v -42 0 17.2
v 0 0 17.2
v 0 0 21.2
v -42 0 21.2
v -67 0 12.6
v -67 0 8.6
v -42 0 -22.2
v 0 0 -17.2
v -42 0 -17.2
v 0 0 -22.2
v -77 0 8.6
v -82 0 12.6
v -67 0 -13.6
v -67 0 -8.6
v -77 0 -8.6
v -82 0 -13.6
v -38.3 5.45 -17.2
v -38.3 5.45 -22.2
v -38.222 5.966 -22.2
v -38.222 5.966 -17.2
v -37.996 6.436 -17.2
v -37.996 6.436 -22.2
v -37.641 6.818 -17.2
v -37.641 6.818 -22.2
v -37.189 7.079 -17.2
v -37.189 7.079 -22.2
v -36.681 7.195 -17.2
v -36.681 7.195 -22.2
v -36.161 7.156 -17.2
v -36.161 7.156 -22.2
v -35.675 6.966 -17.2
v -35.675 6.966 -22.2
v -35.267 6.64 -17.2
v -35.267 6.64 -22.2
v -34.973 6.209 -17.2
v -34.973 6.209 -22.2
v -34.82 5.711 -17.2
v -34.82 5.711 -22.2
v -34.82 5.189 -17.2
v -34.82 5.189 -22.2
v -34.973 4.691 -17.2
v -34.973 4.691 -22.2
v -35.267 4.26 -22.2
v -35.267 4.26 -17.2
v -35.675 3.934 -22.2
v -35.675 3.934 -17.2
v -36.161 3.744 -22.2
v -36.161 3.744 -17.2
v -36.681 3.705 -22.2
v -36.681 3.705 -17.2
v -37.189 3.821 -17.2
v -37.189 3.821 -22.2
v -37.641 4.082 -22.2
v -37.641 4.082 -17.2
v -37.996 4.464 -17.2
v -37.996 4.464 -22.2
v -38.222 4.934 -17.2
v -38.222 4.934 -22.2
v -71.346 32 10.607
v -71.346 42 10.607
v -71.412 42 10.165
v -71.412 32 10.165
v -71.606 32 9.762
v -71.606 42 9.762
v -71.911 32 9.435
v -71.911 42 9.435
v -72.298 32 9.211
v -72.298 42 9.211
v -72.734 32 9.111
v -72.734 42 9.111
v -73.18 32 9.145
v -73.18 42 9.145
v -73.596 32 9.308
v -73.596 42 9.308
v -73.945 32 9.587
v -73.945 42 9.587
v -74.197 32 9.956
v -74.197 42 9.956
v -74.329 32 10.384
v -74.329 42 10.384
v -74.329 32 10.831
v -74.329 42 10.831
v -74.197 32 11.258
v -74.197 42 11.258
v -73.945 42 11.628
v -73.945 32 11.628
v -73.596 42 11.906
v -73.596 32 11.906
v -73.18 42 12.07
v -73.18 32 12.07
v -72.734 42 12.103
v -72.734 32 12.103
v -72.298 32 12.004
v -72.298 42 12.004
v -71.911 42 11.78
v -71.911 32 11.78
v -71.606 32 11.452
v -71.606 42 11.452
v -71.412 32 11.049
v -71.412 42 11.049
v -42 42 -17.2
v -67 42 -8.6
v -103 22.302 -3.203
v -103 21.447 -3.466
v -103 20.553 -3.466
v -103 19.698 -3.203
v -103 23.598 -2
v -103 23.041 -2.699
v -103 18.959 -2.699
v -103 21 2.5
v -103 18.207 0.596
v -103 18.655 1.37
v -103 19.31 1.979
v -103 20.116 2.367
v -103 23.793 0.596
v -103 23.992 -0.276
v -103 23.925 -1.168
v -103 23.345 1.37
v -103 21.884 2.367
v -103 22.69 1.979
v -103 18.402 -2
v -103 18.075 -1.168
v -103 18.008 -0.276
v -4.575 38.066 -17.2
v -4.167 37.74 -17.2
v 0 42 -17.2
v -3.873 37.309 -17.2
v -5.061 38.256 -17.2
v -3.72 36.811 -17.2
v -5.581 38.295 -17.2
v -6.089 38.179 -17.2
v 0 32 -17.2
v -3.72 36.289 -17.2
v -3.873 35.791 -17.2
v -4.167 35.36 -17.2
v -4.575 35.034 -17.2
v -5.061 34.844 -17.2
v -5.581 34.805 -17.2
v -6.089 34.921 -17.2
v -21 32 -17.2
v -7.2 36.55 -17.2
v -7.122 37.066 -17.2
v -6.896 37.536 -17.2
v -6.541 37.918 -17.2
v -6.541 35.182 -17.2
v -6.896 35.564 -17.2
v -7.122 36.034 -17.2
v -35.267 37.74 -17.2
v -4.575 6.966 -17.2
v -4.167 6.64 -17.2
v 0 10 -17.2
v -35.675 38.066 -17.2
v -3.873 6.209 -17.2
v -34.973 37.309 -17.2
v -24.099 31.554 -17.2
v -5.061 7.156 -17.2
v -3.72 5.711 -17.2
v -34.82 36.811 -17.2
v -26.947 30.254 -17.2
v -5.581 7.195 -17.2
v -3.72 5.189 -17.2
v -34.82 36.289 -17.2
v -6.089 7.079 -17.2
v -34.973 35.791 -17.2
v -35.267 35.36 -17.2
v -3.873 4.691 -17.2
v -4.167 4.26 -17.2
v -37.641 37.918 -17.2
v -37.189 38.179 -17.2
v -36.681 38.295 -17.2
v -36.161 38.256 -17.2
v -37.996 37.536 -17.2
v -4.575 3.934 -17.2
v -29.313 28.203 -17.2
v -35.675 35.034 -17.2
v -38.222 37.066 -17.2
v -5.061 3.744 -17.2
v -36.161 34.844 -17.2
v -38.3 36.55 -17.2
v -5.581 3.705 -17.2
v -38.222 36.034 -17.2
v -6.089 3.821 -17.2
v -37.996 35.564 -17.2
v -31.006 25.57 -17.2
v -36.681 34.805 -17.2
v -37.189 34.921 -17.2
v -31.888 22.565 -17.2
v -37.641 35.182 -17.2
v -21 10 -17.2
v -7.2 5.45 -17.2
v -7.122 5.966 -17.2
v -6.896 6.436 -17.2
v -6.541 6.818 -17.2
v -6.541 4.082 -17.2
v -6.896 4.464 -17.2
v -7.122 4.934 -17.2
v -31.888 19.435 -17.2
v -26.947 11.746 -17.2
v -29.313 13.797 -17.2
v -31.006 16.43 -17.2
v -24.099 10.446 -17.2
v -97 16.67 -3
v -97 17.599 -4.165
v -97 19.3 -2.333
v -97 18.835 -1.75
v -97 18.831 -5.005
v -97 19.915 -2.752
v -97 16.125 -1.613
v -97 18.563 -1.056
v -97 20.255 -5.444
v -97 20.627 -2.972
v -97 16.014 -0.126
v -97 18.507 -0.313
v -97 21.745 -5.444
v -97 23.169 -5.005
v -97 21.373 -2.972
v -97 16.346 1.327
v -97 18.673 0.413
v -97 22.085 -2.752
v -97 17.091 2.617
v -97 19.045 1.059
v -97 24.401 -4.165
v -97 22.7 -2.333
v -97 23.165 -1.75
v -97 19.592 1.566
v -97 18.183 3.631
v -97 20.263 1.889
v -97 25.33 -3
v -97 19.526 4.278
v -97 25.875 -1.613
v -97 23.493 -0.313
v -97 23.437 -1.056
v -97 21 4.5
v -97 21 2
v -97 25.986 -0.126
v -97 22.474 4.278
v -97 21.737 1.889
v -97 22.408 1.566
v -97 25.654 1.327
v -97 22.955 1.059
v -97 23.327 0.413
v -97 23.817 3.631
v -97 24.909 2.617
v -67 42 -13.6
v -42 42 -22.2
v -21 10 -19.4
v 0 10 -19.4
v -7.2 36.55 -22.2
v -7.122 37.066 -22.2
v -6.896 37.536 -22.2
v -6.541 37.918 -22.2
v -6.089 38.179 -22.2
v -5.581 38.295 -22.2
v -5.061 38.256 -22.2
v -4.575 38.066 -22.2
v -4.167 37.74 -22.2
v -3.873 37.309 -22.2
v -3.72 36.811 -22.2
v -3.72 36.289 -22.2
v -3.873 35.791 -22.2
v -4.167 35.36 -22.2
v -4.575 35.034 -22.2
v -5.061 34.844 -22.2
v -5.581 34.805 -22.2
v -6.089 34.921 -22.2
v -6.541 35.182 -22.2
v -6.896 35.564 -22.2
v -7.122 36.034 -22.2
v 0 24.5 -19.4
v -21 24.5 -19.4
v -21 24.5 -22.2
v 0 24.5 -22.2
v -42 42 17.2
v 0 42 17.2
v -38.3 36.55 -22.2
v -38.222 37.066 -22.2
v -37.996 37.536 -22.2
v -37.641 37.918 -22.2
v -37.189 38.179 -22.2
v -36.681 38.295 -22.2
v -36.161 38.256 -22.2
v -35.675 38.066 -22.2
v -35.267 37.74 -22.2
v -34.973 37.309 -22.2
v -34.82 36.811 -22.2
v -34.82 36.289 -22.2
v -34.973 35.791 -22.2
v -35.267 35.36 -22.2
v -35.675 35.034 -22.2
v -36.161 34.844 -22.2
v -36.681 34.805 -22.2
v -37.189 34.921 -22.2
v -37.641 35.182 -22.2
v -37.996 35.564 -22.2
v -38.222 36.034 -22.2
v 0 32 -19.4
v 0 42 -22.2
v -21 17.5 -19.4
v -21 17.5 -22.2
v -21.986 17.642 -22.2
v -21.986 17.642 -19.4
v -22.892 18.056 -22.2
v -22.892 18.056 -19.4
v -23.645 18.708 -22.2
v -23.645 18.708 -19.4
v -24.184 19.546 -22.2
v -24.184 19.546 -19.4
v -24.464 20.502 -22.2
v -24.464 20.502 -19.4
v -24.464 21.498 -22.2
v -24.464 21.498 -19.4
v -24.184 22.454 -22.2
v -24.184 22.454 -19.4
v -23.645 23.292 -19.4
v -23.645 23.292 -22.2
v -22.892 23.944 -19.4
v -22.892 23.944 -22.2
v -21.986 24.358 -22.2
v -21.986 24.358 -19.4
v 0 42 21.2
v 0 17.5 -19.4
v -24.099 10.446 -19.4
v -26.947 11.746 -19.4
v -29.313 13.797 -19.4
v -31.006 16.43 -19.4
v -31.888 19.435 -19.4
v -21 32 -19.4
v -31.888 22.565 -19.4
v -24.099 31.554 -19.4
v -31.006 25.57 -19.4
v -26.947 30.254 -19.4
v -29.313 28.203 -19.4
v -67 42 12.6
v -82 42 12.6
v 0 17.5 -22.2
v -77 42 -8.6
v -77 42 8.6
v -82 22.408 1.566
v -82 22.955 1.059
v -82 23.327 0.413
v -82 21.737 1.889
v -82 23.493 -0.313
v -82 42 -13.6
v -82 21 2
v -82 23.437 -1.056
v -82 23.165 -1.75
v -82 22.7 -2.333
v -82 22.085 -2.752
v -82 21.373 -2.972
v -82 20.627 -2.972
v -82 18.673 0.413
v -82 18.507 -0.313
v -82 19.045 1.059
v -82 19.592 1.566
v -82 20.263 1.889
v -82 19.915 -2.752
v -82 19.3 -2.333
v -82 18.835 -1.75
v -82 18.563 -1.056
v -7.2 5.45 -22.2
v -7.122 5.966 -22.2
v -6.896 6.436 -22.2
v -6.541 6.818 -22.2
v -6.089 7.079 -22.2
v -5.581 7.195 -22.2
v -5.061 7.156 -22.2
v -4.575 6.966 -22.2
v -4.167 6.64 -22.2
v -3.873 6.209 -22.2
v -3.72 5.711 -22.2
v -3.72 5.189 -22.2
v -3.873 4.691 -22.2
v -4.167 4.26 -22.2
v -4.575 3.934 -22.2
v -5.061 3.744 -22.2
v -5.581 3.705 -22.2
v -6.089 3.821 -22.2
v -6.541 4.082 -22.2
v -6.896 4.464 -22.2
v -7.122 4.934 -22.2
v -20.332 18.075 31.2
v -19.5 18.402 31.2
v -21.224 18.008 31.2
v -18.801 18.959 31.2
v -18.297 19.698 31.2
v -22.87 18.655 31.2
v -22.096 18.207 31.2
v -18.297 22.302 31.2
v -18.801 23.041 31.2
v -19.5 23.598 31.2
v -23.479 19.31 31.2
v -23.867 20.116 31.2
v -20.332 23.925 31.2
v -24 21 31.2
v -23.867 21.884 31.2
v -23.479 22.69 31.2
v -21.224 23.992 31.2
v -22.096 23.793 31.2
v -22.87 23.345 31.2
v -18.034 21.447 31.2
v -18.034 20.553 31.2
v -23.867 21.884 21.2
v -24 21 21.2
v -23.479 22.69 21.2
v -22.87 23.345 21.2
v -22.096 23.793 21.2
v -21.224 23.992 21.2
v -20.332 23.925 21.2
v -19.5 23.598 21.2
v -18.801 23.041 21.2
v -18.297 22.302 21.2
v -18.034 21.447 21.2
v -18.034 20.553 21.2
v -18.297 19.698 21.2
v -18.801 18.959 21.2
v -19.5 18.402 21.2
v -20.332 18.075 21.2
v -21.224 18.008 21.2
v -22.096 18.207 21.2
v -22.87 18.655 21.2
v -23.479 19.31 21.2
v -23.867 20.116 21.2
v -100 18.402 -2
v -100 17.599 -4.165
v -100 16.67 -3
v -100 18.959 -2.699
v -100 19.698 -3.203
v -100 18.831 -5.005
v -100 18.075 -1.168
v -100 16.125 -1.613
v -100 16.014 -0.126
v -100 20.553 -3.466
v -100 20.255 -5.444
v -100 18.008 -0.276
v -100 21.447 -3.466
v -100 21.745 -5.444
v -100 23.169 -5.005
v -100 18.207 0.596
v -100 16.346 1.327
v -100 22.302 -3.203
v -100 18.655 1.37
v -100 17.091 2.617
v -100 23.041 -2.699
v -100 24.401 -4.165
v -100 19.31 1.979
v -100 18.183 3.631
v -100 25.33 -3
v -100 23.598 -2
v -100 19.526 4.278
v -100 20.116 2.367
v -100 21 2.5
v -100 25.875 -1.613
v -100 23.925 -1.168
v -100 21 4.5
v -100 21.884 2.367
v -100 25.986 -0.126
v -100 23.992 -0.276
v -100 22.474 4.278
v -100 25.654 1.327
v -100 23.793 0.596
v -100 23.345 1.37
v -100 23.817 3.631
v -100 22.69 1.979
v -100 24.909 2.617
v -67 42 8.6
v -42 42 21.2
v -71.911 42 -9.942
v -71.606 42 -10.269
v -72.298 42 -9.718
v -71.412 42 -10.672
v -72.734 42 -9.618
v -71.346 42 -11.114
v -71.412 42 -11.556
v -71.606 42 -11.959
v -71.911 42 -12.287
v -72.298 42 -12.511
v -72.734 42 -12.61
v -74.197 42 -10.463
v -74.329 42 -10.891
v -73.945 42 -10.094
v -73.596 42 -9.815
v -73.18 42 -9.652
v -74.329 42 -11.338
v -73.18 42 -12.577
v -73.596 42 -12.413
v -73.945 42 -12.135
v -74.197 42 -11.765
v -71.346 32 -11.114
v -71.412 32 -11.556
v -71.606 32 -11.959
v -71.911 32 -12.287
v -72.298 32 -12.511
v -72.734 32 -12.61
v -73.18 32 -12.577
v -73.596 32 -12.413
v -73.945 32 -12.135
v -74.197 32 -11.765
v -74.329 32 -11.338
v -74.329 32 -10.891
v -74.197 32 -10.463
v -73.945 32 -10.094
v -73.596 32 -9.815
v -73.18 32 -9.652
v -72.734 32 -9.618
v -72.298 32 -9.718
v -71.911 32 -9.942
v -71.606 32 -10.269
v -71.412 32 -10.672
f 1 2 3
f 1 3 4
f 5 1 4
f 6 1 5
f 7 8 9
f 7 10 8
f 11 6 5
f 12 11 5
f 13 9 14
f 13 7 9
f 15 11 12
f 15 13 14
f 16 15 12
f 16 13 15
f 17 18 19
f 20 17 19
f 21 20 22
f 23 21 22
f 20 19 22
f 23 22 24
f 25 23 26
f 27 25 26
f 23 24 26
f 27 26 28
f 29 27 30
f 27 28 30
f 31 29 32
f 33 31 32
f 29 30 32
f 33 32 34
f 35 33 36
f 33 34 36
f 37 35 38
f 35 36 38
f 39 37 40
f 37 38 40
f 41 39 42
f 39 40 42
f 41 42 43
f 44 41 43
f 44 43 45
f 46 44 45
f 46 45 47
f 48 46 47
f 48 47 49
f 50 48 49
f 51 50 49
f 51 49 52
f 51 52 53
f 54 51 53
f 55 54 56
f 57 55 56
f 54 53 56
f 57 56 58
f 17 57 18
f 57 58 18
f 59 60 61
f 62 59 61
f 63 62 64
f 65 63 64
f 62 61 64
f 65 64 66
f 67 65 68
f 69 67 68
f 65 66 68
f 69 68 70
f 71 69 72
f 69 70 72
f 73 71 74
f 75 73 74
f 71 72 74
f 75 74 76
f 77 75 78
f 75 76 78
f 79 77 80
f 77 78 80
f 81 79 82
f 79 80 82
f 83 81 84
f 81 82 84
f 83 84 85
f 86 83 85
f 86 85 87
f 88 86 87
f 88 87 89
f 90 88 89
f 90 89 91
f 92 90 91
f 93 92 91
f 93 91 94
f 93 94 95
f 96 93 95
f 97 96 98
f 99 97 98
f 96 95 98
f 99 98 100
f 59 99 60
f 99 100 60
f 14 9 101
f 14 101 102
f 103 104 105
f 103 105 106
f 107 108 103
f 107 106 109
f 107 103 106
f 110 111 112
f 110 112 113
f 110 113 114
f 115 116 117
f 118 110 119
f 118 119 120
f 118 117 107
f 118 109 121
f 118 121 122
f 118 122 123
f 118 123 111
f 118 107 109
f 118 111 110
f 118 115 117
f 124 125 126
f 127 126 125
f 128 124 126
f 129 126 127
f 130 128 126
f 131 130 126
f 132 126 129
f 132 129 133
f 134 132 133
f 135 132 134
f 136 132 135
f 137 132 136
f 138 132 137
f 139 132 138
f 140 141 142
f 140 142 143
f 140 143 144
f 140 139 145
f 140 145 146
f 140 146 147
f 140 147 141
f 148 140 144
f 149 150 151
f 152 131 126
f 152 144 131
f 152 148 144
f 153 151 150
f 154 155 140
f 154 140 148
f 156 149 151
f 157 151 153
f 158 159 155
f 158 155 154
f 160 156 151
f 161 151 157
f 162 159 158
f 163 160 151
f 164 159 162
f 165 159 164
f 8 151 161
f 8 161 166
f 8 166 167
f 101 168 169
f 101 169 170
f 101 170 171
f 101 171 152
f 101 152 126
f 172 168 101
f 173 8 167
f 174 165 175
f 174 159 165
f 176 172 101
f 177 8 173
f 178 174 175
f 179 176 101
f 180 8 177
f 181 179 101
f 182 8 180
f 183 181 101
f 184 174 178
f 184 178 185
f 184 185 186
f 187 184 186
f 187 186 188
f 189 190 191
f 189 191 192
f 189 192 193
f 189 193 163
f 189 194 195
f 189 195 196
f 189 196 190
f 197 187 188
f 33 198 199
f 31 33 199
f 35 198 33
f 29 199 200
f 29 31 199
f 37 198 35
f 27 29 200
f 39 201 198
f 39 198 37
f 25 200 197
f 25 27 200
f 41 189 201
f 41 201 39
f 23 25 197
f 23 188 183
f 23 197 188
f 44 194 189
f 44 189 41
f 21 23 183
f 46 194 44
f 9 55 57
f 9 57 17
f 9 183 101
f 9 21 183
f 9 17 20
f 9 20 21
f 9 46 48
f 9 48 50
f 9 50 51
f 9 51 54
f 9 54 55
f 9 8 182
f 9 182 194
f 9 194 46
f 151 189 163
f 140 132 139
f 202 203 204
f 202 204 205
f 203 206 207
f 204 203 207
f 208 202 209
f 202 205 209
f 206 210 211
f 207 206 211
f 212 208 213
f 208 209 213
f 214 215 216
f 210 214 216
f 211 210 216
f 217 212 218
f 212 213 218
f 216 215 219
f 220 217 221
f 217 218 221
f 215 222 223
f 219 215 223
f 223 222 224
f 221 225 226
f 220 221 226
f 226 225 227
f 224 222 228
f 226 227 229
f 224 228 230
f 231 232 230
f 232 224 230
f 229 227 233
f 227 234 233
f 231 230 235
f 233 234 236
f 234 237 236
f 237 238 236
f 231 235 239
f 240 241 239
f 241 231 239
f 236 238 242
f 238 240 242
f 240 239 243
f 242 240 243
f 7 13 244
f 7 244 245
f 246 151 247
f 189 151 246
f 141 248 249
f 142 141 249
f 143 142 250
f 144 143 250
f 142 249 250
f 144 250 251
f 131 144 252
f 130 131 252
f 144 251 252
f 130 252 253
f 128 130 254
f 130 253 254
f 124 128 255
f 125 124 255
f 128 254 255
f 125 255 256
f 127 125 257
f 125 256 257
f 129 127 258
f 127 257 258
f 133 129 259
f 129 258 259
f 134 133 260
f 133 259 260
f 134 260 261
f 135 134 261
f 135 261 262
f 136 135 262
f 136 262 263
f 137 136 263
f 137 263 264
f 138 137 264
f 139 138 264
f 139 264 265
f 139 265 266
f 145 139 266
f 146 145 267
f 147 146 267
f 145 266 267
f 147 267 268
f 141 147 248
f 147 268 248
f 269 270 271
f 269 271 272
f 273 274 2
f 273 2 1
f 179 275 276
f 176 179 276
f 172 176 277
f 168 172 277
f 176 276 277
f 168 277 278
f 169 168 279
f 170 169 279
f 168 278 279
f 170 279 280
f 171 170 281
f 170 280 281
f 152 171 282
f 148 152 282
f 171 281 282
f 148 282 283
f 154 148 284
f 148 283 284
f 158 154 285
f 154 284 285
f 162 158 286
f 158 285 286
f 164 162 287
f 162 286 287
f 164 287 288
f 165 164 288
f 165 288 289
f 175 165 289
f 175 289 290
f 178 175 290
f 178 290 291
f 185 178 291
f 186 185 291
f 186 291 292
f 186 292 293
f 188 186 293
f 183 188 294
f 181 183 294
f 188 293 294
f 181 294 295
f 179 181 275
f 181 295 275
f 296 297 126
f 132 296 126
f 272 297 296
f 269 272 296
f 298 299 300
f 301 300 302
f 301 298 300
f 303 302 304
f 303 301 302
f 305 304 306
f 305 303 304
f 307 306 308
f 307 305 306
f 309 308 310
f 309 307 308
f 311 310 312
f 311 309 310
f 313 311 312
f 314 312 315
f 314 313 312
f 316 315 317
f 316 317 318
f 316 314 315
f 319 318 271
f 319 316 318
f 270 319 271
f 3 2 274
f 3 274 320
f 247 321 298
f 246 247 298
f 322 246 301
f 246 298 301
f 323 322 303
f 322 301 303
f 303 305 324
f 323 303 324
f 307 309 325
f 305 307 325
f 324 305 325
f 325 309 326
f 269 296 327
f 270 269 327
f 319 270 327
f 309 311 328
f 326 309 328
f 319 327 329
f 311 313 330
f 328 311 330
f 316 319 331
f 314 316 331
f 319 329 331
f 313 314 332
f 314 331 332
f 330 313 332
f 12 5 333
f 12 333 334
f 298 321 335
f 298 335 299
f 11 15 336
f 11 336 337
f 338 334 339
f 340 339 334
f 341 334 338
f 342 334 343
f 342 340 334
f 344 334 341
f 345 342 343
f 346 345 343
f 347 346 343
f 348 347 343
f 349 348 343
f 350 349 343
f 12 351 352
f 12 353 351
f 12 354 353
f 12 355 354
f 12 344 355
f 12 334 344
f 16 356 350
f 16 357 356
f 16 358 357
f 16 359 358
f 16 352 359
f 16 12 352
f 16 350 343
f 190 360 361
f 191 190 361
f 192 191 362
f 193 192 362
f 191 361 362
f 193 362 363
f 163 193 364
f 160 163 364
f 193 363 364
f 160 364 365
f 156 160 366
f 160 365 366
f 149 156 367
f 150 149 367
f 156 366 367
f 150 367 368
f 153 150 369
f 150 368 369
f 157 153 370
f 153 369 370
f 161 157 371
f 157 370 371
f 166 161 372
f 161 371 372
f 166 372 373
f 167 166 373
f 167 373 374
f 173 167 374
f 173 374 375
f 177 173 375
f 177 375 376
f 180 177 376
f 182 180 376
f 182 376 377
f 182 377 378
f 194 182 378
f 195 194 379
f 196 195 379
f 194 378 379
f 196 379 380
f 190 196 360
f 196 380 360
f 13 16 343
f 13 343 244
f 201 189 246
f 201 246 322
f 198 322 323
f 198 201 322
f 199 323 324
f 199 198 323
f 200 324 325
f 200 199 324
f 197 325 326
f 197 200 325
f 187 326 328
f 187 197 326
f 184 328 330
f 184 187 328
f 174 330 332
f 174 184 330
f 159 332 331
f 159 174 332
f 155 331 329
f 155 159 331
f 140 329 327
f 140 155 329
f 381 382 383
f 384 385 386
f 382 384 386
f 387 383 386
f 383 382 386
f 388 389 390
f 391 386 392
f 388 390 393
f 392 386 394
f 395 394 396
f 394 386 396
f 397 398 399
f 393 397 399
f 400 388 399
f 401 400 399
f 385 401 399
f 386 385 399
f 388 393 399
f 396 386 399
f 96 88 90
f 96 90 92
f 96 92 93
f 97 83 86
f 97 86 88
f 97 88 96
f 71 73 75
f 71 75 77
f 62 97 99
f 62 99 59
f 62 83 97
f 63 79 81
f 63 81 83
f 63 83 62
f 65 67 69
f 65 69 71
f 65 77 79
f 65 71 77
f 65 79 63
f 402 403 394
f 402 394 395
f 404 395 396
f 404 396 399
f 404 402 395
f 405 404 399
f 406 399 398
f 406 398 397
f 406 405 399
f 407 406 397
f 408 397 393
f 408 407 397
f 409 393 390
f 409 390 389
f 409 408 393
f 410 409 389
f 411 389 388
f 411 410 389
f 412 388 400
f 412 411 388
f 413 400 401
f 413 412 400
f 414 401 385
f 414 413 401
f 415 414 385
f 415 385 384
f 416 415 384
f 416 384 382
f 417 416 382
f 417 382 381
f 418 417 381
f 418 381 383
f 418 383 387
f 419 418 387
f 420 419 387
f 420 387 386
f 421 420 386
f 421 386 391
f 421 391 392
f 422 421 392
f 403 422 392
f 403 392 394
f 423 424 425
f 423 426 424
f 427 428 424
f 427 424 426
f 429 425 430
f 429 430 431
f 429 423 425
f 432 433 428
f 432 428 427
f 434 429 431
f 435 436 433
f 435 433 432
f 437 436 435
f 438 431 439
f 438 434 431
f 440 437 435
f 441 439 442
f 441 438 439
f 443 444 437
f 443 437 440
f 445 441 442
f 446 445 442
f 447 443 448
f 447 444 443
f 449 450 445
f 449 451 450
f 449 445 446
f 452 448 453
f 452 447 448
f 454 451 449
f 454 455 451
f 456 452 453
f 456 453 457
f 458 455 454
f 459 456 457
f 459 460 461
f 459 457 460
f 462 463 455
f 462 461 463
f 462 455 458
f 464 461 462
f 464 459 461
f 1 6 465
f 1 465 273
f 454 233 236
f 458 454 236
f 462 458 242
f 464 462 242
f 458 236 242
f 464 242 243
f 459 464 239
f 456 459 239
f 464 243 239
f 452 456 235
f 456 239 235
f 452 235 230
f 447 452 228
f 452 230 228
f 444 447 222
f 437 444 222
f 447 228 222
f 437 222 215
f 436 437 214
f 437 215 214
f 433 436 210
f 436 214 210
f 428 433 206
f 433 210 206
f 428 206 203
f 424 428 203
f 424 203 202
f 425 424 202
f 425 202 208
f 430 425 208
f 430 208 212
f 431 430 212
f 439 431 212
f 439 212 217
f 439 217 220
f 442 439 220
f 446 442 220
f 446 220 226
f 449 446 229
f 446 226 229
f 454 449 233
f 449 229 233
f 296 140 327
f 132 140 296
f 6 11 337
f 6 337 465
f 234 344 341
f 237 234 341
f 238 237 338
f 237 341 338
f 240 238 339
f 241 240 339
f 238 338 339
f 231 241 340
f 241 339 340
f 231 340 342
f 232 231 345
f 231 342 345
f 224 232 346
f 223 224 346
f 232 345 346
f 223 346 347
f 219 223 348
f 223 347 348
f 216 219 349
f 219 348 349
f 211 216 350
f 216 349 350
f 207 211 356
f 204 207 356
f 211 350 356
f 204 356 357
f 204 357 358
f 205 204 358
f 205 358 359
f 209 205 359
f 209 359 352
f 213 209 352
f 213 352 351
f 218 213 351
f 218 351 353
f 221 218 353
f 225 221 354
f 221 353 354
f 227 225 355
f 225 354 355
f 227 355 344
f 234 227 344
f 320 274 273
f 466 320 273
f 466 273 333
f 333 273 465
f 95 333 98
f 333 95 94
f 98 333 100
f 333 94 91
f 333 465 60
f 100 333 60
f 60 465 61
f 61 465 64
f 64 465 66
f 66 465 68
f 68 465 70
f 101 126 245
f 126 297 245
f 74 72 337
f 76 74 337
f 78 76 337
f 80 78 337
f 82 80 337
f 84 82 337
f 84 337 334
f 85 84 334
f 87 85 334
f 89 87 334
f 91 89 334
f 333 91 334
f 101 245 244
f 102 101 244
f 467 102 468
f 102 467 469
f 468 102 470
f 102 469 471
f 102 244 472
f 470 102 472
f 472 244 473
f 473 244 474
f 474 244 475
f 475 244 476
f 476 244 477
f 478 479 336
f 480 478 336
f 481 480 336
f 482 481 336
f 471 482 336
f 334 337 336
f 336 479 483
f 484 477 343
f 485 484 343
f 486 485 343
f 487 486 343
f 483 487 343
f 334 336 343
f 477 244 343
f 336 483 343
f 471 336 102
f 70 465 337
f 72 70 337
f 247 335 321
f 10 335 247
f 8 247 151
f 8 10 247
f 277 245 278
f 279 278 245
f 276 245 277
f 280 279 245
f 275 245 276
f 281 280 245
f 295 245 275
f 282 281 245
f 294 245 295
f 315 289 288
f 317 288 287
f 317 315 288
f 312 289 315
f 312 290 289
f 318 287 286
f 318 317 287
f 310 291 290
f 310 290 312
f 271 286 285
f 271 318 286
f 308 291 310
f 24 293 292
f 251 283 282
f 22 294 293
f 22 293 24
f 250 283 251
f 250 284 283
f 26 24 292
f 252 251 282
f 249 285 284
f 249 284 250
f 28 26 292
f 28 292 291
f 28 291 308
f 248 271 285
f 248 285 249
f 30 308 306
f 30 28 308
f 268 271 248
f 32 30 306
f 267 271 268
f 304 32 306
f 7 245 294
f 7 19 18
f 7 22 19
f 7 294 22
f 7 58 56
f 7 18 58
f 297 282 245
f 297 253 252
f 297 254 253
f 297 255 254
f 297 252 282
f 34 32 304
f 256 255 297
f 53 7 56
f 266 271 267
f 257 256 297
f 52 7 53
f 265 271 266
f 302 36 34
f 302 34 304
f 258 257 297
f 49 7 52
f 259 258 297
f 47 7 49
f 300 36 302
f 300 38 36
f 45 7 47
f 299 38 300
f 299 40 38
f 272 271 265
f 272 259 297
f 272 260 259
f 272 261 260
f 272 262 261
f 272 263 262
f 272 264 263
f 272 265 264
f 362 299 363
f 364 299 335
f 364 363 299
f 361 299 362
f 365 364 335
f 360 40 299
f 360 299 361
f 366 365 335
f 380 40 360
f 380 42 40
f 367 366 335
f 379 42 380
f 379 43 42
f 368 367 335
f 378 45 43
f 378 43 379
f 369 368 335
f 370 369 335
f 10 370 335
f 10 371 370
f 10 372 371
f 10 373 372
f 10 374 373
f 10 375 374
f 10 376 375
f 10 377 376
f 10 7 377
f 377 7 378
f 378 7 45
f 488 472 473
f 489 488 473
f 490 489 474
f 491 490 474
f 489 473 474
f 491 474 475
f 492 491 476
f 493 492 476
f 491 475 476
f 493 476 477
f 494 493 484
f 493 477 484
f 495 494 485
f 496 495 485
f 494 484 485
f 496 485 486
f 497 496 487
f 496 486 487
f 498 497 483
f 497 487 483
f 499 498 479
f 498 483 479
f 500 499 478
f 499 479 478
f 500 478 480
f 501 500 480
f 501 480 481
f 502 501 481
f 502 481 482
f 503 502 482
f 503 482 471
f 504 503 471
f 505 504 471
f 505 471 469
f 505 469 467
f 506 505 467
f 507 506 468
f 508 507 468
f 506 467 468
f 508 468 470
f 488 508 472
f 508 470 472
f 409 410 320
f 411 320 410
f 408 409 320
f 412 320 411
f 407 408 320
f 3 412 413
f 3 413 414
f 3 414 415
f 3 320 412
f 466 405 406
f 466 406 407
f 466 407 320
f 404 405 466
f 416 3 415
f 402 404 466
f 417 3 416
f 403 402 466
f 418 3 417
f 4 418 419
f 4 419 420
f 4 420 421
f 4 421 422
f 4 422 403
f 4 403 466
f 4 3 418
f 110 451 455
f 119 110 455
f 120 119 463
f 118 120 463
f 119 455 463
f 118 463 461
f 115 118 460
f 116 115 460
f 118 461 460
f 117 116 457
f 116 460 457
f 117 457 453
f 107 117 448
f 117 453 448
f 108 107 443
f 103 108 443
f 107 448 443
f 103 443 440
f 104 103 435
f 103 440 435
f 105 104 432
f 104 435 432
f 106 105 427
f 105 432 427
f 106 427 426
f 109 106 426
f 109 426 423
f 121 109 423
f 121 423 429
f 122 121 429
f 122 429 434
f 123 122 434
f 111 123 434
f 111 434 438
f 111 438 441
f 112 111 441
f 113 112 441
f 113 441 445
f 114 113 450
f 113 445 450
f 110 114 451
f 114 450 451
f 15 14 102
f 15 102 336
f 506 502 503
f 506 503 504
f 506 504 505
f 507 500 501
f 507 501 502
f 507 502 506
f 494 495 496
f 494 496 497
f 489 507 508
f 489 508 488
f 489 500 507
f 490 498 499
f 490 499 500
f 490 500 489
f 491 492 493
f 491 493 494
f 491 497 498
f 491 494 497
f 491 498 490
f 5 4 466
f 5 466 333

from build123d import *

# Parameters (mm, degrees)
BOSS_EXTRUDE1_DEPTH = 42
CUT_EXTRUDE2_DEPTH  = 2.2
CUT_EXTRUDE3_DEPTH  = 5
SKETCH7_R           = 1.75
CUT_EXTRUDE5_DEPTH  = 5
SKETCH8_R           = 2.5
BOSS_EXTRUDE2_DEPTH = 15
SKETCH9_R           = 3
BOSS_EXTRUDE3_DEPTH = 14
SKETCH10_R          = 1.5
CUT_EXTRUDE6_DEPTH  = 10
SKETCH11_R          = 5
BOSS_EXTRUDE4_DEPTH = 3
SKETCH12_R          = 3
BOSS_EXTRUDE5_DEPTH = 3


with BuildPart() as part:
    # Sketch1 → Boss-Extrude1 (new body)
    with BuildSketch(Plane(origin=(0, 0, 0), x_dir=(1, 0, 0), z_dir=(0, 1, 0))):
        Polygon((0, 17.2), (-42, 17.2), (-67, 8.6), (-77, 8.6), (-77, -8.6), (-67, -8.6), (-42, -17.2), (0, -17.2), (0, -21.2), (-42, -21.2), (-67, -12.6), (-82, -12.6), (-82, 13.6), (-67, 13.6), (-42, 22.2), (0, 22.2), align=None)
    extrude(amount=BOSS_EXTRUDE1_DEPTH)

    # Sketch3 → Cut-Extrude2 (cut)
    with BuildSketch(Plane.XY.offset(-17.2)):
        with BuildLine():
            Line((-21, 32), (0, 32))
            Line((0, 32), (0, 10))
            Line((0, 10), (-21, 10))
            ThreePointArc((-21, 10), (-32, 21), (-21, 32))
        make_face()
    extrude(amount=-CUT_EXTRUDE2_DEPTH, mode=Mode.SUBTRACT)

    # Sketch4 → Cut-Extrude3 (cut)
    with BuildSketch(Plane.XY.offset(-17.2)):
        with BuildLine():
            Line((-21, 24.5), (0, 24.5))
            Line((0, 24.5), (0, 17.5))
            Line((0, 17.5), (-21, 17.5))
            ThreePointArc((-21, 17.5), (-24.5, 21), (-21, 24.5))
        make_face()
    extrude(amount=-CUT_EXTRUDE3_DEPTH, mode=Mode.SUBTRACT)

    # Sketch7 → Cut-Extrude5 (cut)
    with BuildSketch(Plane(origin=(0, 0, -22.2), x_dir=(-1, 0, 0), z_dir=(0, 0, -1))):
        with Locations((5.45, 36.55)):
            Circle(SKETCH7_R)
        with Locations((36.55, 36.55)):
            Circle(SKETCH7_R)
        with Locations((5.45, 5.45)):
            Circle(SKETCH7_R)
        with Locations((36.55, 5.45)):
            Circle(SKETCH7_R)
    extrude(amount=-CUT_EXTRUDE5_DEPTH, mode=Mode.SUBTRACT)

    # Sketch8 → Boss-Extrude2 (add)
    with BuildSketch(Plane.ZY.offset(82)):
        with Locations((-0.5, 21)):
            Circle(SKETCH8_R)
    extrude(amount=BOSS_EXTRUDE2_DEPTH)

    # Sketch9 → Boss-Extrude3 (add)
    with BuildSketch(Plane(origin=(0, 0, 17.2), x_dir=(-1, 0, 0), z_dir=(0, 0, -1))):
        with Locations((21, 21)):
            Circle(SKETCH9_R)
    extrude(amount=-BOSS_EXTRUDE3_DEPTH)

    # Sketch10 → Cut-Extrude6 (cut)
    with BuildSketch(Plane(origin=(0, 42, 0), x_dir=(1, 0, 0), z_dir=(0, 1, 0))):
        with Locations((-72.845749412, 11.114300727)):
            Circle(SKETCH10_R)
        with Locations((-72.845749412, -10.607252687)):
            Circle(SKETCH10_R)
    extrude(amount=-CUT_EXTRUDE6_DEPTH, mode=Mode.SUBTRACT)

    # Sketch11 → Boss-Extrude4 (add)
    with BuildSketch(Plane.ZY.offset(97)):
        with Locations((-0.5, 21)):
            Circle(SKETCH11_R)
    extrude(amount=BOSS_EXTRUDE4_DEPTH)

    # Sketch12 → Boss-Extrude5 (add)
    with BuildSketch(Plane.ZY.offset(100)):
        with Locations((-0.5, 21)):
            Circle(SKETCH12_R)
    extrude(amount=BOSS_EXTRUDE5_DEPTH)


solid = part.part
